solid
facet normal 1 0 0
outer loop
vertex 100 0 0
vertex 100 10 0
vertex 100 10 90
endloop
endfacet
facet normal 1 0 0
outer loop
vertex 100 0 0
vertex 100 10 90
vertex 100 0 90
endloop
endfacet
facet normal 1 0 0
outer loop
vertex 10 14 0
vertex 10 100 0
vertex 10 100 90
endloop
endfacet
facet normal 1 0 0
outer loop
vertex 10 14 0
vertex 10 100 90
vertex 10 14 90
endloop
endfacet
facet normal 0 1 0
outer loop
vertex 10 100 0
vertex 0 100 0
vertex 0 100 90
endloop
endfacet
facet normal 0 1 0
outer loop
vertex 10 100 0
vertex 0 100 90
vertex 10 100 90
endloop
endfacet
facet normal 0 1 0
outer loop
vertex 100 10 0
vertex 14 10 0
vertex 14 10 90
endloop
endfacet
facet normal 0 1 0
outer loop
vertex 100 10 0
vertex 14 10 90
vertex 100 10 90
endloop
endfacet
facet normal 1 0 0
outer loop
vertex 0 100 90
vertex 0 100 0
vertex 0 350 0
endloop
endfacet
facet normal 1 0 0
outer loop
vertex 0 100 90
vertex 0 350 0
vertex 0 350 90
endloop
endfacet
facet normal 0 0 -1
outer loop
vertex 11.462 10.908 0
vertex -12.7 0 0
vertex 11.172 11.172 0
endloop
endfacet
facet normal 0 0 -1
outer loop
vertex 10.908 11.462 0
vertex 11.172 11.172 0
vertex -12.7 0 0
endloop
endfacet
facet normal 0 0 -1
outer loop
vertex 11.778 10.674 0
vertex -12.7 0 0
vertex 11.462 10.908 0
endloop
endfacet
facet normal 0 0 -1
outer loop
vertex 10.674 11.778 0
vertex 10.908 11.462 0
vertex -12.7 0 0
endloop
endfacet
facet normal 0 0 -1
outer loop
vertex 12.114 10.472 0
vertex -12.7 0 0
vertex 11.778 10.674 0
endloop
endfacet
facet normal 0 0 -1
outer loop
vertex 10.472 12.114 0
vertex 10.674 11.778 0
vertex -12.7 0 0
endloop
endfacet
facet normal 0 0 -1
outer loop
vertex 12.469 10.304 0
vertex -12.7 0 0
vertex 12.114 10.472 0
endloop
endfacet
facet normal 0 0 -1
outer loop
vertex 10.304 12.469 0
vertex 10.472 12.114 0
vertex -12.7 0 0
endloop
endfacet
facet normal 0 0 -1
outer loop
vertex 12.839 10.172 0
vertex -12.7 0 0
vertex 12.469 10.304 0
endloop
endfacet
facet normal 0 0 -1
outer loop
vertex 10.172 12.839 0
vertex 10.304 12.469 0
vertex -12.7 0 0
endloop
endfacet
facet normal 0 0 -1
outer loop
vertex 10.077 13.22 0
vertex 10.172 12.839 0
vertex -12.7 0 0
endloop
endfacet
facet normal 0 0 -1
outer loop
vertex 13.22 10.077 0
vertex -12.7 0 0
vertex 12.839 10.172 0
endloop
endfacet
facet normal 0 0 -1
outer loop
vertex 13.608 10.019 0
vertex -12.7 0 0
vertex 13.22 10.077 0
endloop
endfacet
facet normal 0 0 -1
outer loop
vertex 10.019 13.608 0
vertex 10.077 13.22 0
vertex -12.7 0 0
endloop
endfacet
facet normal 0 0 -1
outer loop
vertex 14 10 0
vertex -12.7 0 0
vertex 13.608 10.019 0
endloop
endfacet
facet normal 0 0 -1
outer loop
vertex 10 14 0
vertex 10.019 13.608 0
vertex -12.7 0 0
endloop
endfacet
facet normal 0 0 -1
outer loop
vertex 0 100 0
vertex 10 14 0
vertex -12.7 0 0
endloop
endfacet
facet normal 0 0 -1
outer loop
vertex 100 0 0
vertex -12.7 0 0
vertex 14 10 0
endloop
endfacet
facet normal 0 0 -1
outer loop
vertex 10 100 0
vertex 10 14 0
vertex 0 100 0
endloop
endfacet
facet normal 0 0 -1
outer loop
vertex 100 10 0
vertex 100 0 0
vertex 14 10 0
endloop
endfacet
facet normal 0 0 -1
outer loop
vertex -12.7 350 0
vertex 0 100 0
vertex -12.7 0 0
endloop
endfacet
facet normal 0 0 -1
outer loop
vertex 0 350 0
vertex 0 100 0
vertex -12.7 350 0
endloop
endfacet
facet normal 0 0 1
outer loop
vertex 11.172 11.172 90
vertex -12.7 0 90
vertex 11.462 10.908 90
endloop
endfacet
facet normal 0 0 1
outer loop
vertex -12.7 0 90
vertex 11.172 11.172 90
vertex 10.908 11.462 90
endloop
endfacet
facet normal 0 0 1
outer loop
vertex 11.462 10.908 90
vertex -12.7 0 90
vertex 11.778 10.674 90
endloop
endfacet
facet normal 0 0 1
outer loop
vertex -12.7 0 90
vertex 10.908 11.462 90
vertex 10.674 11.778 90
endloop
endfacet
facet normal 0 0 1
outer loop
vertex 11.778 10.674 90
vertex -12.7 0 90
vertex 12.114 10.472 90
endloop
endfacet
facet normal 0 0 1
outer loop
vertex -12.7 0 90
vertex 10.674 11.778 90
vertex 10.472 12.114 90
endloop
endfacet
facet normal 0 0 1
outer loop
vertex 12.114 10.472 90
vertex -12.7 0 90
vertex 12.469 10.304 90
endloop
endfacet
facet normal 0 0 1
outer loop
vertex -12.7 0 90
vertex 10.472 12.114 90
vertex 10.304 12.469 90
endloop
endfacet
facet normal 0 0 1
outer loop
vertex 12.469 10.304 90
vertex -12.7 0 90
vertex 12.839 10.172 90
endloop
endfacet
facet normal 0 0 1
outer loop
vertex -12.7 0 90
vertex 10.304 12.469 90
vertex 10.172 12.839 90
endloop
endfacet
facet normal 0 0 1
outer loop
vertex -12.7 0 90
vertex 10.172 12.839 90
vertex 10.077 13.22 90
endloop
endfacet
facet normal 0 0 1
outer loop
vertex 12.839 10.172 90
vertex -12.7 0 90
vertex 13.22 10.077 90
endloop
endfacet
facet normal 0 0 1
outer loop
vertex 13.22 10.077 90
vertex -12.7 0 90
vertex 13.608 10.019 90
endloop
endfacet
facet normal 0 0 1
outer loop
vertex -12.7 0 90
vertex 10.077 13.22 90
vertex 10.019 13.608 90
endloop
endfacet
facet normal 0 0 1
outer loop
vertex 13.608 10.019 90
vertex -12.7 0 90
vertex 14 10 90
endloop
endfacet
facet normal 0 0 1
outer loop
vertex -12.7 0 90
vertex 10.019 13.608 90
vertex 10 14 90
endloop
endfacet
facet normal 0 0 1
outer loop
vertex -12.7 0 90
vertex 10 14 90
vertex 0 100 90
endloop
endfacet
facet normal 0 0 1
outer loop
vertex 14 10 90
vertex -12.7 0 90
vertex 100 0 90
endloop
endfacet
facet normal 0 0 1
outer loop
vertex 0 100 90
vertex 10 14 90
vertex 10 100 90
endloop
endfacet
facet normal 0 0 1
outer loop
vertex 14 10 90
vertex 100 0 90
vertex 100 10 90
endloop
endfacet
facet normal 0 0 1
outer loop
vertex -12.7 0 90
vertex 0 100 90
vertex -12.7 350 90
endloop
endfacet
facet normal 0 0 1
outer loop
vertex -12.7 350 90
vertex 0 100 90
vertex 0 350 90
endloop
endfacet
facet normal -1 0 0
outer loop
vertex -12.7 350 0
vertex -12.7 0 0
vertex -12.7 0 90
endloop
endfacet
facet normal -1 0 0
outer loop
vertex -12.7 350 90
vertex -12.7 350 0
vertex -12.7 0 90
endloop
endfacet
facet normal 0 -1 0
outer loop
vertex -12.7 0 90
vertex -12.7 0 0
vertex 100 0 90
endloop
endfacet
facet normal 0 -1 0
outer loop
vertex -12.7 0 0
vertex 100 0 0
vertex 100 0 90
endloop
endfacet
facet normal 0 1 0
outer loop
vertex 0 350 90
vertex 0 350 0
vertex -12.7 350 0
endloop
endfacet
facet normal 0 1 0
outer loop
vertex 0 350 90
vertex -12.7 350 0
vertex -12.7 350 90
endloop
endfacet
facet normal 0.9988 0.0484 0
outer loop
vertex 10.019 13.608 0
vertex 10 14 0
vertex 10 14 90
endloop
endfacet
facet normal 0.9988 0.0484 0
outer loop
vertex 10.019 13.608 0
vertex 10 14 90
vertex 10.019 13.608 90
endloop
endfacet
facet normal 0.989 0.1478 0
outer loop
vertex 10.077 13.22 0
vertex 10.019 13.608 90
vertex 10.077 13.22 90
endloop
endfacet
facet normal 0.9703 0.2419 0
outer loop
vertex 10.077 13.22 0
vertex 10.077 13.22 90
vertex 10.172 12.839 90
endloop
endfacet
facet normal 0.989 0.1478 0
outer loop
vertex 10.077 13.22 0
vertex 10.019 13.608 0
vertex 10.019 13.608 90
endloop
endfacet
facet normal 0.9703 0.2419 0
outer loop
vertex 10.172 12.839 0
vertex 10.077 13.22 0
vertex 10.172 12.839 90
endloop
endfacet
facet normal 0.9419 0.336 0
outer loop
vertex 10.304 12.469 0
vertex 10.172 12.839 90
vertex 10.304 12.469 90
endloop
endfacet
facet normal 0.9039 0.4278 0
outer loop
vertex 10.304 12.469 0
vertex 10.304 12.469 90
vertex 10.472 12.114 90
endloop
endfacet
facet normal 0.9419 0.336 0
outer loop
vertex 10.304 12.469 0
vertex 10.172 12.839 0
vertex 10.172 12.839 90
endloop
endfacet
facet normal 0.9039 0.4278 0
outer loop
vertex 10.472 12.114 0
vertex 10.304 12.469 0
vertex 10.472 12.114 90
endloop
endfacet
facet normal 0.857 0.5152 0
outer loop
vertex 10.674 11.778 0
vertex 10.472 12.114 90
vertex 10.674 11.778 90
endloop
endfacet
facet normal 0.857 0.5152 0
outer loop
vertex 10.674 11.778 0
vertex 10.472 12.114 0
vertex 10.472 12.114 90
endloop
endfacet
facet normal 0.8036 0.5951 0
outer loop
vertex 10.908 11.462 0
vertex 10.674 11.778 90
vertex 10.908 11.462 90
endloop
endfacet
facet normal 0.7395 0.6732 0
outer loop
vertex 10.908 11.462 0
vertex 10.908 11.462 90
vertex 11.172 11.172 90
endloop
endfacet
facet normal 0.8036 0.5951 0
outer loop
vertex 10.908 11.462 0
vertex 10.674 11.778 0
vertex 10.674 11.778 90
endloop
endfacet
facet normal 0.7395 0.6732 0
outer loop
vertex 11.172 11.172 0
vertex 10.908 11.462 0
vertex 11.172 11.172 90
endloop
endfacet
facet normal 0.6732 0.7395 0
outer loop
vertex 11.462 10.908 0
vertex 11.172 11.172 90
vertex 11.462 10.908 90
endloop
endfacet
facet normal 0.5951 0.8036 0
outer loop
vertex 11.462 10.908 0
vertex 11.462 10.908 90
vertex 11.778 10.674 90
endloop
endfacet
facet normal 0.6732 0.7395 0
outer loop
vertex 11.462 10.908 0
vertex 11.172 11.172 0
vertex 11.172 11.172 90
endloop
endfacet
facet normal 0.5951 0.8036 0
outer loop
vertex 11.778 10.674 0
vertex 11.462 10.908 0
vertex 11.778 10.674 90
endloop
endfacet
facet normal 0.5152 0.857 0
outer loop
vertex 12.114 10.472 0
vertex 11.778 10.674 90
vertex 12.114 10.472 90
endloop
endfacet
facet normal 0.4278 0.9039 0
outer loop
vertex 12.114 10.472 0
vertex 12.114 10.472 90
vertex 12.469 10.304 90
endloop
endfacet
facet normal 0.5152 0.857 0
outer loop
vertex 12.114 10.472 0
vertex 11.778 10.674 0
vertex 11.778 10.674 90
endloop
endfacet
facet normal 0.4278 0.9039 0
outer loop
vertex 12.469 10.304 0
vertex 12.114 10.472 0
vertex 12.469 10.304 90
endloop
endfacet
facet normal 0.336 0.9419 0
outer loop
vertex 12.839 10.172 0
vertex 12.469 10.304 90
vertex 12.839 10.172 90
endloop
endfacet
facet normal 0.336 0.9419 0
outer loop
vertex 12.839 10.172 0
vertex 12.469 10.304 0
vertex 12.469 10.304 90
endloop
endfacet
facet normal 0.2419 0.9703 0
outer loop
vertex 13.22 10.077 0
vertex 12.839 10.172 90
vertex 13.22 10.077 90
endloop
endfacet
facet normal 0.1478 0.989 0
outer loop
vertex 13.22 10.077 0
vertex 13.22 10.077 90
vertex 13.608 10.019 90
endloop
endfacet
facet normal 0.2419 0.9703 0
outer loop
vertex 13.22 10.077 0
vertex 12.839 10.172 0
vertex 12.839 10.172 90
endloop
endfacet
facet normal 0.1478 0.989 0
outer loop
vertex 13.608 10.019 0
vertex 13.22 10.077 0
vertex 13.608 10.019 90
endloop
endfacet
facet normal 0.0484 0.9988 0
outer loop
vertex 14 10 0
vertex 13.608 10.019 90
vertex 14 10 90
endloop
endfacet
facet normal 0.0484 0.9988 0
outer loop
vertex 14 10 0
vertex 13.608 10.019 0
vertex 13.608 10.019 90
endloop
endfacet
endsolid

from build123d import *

# Parameters (mm, degrees)
SALIENTE_EXTRUIR1_DEPTH = 90
CROQUIS2_W              = 90
CROQUIS2_H              = 350
SALIENTE_EXTRUIR2_DEPTH = 12.7


with BuildPart() as part:
    # Croquis1 → Saliente-Extruir1 (new body)
    with BuildSketch(Plane.XY):
        with BuildLine():
            Line((0, 0), (0, 100))
            Line((0, 100), (10, 100))
            Line((10, 100), (10, 14))
            ThreePointArc((10, 14), (11.171572875, 11.171572875), (14, 10))
            Line((14, 10), (100, 10))
            Line((100, 10), (100, 0))
            Line((100, 0), (0, 0))
        make_face()
    extrude(amount=SALIENTE_EXTRUIR1_DEPTH)

    # Croquis2 → Saliente-Extruir2 (add)
    with BuildSketch(Plane.ZY):
        with Locations((45, 175)):
            Rectangle(CROQUIS2_W, CROQUIS2_H)
    extrude(amount=SALIENTE_EXTRUIR2_DEPTH)


solid = part.part
